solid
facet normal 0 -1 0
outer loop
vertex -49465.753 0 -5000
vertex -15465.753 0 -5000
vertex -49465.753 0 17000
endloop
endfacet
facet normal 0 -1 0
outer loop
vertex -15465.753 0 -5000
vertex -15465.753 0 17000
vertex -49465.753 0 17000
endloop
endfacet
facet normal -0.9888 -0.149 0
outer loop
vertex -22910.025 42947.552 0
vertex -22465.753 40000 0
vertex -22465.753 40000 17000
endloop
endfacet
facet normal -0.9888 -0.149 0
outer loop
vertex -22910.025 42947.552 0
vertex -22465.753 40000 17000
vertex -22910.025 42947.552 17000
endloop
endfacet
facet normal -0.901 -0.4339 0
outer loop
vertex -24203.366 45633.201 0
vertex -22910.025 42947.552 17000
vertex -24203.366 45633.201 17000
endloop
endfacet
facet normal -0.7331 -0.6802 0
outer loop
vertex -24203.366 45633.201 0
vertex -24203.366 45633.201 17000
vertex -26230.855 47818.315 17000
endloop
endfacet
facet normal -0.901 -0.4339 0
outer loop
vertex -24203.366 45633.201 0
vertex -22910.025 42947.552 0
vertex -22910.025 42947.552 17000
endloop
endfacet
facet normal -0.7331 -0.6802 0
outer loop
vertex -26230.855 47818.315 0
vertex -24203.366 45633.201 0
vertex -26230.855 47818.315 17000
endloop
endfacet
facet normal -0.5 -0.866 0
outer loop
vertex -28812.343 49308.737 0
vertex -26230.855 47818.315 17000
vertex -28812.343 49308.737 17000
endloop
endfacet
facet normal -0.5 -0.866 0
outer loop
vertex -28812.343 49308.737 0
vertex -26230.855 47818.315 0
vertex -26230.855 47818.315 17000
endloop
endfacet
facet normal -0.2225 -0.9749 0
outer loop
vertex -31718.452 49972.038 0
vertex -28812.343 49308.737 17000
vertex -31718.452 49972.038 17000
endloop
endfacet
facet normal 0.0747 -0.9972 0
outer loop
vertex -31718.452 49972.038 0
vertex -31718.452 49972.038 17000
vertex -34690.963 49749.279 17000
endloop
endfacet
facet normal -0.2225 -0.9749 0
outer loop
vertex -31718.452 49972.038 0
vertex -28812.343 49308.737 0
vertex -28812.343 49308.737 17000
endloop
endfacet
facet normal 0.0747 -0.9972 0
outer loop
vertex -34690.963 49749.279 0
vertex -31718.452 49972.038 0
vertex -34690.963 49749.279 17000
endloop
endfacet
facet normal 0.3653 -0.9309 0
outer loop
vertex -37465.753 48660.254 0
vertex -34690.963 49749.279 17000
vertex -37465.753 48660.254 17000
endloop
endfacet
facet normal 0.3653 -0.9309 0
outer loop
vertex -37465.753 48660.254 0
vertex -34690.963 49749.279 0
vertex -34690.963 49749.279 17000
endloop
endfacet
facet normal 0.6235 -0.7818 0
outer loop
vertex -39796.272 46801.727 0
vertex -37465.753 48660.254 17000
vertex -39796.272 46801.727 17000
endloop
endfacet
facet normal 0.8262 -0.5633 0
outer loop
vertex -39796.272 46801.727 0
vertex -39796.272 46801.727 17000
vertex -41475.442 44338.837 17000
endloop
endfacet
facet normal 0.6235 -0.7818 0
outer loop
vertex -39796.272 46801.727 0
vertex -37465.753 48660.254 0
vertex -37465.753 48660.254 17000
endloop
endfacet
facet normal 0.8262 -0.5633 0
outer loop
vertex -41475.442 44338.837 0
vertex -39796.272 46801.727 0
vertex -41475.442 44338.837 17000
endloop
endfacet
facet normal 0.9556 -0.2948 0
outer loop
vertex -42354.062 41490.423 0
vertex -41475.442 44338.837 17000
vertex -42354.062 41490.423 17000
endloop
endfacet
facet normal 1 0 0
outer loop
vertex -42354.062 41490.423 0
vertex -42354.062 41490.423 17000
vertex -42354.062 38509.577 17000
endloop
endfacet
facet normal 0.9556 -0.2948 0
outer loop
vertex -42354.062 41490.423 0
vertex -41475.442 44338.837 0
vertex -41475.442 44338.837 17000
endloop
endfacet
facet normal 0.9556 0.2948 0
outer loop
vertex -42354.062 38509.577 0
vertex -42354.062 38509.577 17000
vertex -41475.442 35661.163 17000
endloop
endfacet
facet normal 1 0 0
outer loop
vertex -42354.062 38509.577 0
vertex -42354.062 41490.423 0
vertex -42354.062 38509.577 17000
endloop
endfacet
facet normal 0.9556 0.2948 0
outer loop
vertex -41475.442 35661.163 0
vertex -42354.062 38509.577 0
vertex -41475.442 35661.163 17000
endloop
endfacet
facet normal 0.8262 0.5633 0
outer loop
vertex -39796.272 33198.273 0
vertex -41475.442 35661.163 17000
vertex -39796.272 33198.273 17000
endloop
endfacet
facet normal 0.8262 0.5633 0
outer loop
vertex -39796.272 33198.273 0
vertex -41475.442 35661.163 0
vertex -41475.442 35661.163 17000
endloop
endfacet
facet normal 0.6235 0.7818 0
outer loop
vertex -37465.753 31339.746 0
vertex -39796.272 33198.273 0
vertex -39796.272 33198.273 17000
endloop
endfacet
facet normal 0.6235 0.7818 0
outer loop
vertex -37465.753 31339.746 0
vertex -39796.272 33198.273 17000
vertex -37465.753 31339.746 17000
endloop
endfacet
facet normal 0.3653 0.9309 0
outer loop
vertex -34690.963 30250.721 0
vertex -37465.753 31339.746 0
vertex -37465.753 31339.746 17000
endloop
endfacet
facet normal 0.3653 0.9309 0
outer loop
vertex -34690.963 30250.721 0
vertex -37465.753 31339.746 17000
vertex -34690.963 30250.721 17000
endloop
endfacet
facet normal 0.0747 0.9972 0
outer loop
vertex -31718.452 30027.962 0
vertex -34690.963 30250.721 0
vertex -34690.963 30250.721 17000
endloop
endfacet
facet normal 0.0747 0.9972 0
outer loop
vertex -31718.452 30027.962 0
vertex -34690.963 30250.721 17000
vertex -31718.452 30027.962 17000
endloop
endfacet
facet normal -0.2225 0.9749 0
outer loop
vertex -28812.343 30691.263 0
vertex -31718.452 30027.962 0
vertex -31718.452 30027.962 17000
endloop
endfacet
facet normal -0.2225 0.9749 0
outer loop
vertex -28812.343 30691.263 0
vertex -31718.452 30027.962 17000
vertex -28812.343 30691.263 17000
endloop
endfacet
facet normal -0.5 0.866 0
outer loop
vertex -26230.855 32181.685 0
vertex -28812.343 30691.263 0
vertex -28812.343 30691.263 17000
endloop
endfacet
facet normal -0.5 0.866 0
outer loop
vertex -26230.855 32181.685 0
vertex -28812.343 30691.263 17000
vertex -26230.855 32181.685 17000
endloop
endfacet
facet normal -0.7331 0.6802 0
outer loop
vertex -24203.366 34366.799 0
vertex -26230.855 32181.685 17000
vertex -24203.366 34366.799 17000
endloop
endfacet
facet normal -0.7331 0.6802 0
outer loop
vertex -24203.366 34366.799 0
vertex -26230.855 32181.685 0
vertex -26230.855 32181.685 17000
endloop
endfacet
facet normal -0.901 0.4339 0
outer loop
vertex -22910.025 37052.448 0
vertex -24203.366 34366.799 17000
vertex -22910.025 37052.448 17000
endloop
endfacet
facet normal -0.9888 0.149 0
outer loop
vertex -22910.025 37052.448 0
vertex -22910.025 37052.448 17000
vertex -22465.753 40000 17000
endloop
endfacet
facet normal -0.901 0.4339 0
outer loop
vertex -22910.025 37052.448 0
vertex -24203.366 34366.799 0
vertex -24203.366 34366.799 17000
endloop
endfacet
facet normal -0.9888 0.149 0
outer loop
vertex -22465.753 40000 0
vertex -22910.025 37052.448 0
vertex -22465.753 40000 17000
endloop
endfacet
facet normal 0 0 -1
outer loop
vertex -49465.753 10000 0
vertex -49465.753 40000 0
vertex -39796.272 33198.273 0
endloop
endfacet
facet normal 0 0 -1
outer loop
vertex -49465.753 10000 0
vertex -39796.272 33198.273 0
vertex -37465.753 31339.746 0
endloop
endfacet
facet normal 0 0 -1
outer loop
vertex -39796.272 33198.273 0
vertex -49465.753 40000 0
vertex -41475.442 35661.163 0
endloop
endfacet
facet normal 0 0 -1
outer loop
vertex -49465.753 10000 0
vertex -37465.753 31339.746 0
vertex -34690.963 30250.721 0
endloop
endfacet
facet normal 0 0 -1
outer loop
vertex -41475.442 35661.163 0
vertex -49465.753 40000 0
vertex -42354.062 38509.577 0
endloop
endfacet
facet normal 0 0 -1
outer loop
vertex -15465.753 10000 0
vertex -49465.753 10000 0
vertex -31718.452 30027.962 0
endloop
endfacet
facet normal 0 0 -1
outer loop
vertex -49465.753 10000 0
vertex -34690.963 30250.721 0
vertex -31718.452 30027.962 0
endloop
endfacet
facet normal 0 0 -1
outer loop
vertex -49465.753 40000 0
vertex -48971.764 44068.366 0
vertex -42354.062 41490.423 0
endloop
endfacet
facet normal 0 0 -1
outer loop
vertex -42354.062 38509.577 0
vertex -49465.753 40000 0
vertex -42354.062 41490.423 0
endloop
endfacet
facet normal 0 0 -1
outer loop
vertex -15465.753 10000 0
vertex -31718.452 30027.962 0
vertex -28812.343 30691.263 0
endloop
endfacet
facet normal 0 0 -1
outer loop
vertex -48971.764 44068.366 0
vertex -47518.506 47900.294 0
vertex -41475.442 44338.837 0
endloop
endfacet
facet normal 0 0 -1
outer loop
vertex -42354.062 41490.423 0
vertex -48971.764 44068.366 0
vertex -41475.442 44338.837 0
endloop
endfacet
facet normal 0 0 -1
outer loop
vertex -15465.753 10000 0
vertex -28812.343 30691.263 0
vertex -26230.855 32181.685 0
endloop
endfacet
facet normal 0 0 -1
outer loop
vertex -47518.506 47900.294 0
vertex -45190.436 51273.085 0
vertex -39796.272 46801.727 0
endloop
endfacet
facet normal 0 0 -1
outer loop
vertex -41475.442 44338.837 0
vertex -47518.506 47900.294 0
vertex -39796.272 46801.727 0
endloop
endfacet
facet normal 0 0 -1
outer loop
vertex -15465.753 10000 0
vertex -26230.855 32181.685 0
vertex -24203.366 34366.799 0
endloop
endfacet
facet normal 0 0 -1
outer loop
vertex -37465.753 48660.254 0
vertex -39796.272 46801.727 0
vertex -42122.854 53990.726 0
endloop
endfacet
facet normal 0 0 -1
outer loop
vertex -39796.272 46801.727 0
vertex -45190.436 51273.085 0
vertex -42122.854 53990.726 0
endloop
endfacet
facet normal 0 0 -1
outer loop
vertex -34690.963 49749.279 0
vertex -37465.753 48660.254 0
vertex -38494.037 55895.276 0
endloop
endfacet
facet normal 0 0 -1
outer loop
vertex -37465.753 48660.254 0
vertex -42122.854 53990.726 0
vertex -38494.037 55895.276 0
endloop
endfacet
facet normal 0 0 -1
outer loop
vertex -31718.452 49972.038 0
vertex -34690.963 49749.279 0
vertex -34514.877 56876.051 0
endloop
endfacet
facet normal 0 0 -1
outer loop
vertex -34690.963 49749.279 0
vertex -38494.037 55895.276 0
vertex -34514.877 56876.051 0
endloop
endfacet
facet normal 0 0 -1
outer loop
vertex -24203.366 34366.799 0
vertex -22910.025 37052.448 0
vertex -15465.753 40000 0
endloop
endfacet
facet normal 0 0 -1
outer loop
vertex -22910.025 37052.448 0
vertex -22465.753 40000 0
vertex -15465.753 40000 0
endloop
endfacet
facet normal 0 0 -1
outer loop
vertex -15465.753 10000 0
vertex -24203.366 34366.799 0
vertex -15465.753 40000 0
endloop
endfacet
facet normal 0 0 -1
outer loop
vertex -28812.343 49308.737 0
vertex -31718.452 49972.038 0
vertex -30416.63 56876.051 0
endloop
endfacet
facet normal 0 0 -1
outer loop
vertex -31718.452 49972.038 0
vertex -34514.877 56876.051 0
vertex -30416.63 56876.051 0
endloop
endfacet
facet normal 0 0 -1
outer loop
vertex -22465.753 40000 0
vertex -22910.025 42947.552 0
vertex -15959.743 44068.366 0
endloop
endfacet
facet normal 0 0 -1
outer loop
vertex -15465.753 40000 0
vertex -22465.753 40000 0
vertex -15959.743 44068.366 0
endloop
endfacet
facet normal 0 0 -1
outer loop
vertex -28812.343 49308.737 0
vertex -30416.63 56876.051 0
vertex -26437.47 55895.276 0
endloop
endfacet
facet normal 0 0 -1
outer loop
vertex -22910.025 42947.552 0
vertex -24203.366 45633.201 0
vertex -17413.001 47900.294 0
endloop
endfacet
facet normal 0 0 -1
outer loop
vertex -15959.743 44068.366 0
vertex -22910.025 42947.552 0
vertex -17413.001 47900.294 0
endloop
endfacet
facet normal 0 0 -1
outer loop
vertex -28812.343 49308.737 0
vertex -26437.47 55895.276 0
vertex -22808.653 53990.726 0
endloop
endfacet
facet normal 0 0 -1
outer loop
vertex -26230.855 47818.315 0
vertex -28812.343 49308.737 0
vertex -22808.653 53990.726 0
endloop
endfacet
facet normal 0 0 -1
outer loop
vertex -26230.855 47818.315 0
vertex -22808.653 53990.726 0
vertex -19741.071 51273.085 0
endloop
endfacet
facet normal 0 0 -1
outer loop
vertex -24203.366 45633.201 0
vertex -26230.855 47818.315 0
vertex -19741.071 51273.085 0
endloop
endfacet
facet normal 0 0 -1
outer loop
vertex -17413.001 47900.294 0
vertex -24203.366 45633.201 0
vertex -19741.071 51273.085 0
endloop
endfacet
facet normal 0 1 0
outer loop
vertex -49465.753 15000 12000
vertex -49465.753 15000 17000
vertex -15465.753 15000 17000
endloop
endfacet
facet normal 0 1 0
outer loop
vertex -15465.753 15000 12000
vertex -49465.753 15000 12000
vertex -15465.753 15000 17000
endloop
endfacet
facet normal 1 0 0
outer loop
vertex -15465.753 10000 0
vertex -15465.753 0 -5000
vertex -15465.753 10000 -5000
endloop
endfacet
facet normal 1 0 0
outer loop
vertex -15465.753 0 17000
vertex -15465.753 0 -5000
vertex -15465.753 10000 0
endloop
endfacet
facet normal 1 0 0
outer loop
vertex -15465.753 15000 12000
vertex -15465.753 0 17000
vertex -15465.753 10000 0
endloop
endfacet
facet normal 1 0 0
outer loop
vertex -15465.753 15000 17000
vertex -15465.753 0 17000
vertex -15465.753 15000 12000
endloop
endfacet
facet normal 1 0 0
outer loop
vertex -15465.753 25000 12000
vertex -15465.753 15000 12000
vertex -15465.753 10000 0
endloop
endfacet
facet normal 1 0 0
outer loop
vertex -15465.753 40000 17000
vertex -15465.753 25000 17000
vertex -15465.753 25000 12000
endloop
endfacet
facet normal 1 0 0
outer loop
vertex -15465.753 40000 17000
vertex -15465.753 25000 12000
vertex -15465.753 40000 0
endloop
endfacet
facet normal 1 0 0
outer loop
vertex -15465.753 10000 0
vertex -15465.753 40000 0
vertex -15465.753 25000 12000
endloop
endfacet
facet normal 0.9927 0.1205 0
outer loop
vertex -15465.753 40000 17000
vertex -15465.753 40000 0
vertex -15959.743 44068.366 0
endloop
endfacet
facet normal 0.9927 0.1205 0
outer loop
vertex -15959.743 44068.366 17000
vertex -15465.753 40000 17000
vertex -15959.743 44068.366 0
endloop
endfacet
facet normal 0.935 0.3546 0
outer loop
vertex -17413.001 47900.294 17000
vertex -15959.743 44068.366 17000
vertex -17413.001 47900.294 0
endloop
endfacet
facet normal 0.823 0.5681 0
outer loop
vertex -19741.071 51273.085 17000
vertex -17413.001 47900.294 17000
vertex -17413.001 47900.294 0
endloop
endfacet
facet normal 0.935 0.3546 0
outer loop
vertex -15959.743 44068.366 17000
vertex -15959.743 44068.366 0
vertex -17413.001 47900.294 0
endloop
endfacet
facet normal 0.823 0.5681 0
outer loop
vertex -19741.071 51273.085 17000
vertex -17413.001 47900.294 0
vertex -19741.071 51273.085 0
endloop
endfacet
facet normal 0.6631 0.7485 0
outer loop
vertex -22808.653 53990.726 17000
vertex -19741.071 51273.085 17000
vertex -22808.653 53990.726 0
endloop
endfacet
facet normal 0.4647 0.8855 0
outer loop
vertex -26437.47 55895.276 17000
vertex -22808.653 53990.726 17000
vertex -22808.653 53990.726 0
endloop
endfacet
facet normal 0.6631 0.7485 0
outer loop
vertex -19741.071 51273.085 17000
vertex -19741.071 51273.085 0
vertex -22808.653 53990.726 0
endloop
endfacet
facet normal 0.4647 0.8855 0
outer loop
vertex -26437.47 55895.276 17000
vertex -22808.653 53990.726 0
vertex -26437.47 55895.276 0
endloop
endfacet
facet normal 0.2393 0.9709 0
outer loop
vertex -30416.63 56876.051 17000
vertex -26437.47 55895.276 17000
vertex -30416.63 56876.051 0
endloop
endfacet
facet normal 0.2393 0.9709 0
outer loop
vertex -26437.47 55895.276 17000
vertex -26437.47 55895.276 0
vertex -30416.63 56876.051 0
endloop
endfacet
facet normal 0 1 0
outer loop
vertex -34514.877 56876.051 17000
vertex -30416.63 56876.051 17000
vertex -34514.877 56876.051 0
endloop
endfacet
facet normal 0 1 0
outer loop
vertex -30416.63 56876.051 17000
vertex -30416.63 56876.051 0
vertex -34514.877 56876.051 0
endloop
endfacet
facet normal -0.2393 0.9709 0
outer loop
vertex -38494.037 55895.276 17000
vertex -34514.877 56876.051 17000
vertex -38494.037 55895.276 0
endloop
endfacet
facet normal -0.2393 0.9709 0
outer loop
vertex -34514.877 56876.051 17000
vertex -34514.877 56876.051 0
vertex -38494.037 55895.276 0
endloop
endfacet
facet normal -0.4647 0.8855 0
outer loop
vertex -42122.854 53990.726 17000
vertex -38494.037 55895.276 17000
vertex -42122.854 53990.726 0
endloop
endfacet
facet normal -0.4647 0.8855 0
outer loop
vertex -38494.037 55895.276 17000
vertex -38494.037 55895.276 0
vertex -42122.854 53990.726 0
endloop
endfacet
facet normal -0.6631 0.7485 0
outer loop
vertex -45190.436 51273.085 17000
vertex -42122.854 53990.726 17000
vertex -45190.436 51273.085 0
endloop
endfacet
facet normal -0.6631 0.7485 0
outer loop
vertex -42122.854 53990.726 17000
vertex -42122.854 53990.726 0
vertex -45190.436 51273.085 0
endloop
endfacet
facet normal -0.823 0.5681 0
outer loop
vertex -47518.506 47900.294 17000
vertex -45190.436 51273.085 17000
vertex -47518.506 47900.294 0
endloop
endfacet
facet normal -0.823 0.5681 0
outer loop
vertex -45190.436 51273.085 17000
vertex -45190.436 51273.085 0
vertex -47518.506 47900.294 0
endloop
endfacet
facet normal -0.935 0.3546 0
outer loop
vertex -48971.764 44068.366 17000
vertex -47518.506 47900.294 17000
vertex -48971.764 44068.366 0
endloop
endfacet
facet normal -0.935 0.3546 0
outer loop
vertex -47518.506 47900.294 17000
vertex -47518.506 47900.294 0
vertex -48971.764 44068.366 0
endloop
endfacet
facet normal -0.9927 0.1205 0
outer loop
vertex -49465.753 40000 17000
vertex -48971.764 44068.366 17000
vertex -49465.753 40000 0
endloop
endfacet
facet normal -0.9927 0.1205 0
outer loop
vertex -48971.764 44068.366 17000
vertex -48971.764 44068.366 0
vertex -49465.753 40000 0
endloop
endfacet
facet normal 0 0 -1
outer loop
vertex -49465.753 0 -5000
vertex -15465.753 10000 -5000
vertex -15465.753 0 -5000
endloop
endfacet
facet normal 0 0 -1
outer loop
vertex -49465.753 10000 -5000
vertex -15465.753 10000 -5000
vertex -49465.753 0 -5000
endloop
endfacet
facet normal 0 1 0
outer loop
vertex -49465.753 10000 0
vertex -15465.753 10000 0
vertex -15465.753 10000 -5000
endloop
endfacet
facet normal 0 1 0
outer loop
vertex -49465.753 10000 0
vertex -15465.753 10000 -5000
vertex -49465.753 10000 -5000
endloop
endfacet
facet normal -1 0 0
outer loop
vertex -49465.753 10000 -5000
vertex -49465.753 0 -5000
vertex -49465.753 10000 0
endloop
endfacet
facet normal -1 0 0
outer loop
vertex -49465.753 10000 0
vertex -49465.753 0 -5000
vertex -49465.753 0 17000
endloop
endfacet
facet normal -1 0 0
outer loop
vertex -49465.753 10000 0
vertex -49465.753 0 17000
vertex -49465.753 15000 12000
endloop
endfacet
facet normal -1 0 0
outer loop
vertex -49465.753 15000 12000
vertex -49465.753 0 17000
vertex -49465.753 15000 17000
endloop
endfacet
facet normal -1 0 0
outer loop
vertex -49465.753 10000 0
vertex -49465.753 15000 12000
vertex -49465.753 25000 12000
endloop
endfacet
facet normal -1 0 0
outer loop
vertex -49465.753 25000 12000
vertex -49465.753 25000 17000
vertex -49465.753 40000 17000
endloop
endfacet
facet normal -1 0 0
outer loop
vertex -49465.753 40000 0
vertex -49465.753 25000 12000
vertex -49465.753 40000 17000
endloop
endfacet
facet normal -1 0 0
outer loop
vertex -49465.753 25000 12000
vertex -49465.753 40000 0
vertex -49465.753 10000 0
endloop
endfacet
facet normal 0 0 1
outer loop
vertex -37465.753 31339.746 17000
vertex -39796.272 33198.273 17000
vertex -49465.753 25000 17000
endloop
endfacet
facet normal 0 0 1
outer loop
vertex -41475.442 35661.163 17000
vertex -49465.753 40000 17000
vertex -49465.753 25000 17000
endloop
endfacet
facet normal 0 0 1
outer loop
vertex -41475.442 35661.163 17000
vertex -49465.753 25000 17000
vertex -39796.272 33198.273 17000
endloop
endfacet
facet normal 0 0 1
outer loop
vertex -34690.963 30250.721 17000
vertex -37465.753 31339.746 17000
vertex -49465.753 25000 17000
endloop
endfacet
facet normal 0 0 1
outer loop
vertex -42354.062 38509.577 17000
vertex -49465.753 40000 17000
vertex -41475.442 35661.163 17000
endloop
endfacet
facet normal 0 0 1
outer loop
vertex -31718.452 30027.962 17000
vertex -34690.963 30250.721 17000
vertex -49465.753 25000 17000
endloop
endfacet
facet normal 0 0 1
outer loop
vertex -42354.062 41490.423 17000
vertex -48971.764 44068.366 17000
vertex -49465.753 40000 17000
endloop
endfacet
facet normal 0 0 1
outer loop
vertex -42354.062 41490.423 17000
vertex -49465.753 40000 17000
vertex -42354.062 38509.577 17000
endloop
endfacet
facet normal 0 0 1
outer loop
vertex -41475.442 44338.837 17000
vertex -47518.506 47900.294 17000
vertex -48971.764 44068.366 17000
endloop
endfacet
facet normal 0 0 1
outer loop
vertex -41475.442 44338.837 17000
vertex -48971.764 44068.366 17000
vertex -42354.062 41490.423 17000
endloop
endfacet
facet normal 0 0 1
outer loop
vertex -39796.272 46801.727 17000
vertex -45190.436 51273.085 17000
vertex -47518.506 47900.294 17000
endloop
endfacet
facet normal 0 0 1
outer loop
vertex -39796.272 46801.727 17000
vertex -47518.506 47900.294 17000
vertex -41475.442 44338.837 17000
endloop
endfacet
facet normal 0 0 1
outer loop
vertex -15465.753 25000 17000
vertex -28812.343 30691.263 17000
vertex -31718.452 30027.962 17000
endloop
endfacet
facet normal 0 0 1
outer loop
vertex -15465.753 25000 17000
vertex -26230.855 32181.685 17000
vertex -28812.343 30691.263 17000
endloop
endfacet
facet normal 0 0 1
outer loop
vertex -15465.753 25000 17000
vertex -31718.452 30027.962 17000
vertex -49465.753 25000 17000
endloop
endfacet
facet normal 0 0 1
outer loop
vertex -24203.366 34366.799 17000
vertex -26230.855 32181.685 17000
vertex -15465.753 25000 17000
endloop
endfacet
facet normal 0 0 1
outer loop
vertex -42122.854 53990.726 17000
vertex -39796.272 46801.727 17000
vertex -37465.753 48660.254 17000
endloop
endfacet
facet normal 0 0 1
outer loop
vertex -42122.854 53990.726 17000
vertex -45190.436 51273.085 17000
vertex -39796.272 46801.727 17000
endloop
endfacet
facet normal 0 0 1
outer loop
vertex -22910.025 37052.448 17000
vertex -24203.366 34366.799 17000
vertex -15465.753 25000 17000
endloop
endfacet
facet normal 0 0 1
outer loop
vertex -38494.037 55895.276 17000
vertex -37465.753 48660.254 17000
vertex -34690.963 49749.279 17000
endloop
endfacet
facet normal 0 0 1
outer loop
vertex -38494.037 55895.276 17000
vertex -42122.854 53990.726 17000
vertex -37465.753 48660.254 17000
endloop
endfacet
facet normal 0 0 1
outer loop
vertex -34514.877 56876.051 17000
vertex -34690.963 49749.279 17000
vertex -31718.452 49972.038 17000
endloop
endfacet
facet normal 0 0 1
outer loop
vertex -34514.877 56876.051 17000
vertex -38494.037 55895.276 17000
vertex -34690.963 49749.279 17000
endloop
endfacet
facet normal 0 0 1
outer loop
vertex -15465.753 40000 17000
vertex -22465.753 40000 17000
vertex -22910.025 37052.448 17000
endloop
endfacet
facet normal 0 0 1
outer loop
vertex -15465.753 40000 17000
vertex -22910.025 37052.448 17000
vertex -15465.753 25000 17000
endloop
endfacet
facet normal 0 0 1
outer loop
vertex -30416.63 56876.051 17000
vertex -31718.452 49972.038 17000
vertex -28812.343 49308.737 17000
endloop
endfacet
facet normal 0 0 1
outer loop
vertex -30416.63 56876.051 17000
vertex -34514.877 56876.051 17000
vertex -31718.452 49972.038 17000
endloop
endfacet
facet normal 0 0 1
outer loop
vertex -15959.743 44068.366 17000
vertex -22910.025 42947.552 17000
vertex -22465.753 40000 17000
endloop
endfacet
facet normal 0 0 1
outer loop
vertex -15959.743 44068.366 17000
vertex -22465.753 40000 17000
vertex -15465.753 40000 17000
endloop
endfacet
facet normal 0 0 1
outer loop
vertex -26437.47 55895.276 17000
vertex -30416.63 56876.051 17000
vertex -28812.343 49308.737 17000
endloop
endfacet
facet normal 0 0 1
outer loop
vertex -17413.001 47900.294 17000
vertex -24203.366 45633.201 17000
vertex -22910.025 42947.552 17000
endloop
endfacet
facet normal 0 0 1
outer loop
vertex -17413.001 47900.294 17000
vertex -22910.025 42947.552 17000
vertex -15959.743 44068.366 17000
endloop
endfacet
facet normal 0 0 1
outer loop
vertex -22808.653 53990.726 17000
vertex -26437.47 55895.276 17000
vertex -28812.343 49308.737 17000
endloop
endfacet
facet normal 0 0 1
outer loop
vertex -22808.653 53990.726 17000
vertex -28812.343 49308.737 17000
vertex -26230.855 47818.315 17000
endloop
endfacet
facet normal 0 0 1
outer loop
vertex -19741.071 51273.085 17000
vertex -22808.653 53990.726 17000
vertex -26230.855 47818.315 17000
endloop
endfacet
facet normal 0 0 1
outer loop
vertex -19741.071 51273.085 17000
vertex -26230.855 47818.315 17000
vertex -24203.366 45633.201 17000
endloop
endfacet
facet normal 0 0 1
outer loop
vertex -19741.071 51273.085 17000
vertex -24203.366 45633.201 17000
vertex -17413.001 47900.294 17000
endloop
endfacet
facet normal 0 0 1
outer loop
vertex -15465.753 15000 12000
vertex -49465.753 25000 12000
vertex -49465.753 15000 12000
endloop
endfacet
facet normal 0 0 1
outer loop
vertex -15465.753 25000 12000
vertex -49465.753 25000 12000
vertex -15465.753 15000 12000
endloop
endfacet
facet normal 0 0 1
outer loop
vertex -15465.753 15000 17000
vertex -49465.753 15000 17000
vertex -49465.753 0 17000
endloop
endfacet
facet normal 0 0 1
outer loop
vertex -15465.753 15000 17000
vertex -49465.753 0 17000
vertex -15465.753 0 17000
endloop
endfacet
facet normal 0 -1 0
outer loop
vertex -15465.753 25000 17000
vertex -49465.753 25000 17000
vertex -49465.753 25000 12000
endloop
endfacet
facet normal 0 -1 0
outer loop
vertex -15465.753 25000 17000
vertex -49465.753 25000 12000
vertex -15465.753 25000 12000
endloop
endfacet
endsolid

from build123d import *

# Parameters (mm, degrees)
SKETCH1_R           = 10000
BOSS_EXTRUDE1_DEPTH = 17000
SKETCH2_W           = 34000
SKETCH2_H           = 10000
CUT_EXTRUDE1_DEPTH  = 5000
SKETCH3_W           = 34000
SKETCH3_H           = 10000
BOSS_EXTRUDE2_DEPTH = 5000


with BuildPart() as part:
    # Sketch1 → Boss-Extrude1 (new body)
    with BuildSketch(Plane.XY):
        with BuildLine():
            Line((-49465.753424658, 40000), (-49465.753424658, 0))
            Line((-49465.753424658, 0), (-15465.753424658, 0))
            Line((-15465.753424658, 0), (-15465.753424658, 40000))
            ThreePointArc((-15465.753424658, 40000), (-32465.753424658, 57000), (-49465.753424658, 40000))
        make_face()
        with Locations((-32465.753424658, 40000)):
            Circle(SKETCH1_R, mode=Mode.SUBTRACT)
    extrude(amount=BOSS_EXTRUDE1_DEPTH)

    # Sketch2 → Cut-Extrude1 (cut)
    with BuildSketch(Plane.XY.offset(17000)):
        with Locations((-32465.753424658, 20000)):
            Rectangle(SKETCH2_W, SKETCH2_H)
    extrude(amount=-CUT_EXTRUDE1_DEPTH, mode=Mode.SUBTRACT)

    # Sketch3 → Boss-Extrude2 (add)
    with BuildSketch(Plane(origin=(0, 0, 0), x_dir=(-1, 0, 0), z_dir=(0, 0, -1))):
        with Locations((32465.753424658, 5000)):
            Rectangle(SKETCH3_W, SKETCH3_H)
    extrude(amount=BOSS_EXTRUDE2_DEPTH)


solid = part.part
